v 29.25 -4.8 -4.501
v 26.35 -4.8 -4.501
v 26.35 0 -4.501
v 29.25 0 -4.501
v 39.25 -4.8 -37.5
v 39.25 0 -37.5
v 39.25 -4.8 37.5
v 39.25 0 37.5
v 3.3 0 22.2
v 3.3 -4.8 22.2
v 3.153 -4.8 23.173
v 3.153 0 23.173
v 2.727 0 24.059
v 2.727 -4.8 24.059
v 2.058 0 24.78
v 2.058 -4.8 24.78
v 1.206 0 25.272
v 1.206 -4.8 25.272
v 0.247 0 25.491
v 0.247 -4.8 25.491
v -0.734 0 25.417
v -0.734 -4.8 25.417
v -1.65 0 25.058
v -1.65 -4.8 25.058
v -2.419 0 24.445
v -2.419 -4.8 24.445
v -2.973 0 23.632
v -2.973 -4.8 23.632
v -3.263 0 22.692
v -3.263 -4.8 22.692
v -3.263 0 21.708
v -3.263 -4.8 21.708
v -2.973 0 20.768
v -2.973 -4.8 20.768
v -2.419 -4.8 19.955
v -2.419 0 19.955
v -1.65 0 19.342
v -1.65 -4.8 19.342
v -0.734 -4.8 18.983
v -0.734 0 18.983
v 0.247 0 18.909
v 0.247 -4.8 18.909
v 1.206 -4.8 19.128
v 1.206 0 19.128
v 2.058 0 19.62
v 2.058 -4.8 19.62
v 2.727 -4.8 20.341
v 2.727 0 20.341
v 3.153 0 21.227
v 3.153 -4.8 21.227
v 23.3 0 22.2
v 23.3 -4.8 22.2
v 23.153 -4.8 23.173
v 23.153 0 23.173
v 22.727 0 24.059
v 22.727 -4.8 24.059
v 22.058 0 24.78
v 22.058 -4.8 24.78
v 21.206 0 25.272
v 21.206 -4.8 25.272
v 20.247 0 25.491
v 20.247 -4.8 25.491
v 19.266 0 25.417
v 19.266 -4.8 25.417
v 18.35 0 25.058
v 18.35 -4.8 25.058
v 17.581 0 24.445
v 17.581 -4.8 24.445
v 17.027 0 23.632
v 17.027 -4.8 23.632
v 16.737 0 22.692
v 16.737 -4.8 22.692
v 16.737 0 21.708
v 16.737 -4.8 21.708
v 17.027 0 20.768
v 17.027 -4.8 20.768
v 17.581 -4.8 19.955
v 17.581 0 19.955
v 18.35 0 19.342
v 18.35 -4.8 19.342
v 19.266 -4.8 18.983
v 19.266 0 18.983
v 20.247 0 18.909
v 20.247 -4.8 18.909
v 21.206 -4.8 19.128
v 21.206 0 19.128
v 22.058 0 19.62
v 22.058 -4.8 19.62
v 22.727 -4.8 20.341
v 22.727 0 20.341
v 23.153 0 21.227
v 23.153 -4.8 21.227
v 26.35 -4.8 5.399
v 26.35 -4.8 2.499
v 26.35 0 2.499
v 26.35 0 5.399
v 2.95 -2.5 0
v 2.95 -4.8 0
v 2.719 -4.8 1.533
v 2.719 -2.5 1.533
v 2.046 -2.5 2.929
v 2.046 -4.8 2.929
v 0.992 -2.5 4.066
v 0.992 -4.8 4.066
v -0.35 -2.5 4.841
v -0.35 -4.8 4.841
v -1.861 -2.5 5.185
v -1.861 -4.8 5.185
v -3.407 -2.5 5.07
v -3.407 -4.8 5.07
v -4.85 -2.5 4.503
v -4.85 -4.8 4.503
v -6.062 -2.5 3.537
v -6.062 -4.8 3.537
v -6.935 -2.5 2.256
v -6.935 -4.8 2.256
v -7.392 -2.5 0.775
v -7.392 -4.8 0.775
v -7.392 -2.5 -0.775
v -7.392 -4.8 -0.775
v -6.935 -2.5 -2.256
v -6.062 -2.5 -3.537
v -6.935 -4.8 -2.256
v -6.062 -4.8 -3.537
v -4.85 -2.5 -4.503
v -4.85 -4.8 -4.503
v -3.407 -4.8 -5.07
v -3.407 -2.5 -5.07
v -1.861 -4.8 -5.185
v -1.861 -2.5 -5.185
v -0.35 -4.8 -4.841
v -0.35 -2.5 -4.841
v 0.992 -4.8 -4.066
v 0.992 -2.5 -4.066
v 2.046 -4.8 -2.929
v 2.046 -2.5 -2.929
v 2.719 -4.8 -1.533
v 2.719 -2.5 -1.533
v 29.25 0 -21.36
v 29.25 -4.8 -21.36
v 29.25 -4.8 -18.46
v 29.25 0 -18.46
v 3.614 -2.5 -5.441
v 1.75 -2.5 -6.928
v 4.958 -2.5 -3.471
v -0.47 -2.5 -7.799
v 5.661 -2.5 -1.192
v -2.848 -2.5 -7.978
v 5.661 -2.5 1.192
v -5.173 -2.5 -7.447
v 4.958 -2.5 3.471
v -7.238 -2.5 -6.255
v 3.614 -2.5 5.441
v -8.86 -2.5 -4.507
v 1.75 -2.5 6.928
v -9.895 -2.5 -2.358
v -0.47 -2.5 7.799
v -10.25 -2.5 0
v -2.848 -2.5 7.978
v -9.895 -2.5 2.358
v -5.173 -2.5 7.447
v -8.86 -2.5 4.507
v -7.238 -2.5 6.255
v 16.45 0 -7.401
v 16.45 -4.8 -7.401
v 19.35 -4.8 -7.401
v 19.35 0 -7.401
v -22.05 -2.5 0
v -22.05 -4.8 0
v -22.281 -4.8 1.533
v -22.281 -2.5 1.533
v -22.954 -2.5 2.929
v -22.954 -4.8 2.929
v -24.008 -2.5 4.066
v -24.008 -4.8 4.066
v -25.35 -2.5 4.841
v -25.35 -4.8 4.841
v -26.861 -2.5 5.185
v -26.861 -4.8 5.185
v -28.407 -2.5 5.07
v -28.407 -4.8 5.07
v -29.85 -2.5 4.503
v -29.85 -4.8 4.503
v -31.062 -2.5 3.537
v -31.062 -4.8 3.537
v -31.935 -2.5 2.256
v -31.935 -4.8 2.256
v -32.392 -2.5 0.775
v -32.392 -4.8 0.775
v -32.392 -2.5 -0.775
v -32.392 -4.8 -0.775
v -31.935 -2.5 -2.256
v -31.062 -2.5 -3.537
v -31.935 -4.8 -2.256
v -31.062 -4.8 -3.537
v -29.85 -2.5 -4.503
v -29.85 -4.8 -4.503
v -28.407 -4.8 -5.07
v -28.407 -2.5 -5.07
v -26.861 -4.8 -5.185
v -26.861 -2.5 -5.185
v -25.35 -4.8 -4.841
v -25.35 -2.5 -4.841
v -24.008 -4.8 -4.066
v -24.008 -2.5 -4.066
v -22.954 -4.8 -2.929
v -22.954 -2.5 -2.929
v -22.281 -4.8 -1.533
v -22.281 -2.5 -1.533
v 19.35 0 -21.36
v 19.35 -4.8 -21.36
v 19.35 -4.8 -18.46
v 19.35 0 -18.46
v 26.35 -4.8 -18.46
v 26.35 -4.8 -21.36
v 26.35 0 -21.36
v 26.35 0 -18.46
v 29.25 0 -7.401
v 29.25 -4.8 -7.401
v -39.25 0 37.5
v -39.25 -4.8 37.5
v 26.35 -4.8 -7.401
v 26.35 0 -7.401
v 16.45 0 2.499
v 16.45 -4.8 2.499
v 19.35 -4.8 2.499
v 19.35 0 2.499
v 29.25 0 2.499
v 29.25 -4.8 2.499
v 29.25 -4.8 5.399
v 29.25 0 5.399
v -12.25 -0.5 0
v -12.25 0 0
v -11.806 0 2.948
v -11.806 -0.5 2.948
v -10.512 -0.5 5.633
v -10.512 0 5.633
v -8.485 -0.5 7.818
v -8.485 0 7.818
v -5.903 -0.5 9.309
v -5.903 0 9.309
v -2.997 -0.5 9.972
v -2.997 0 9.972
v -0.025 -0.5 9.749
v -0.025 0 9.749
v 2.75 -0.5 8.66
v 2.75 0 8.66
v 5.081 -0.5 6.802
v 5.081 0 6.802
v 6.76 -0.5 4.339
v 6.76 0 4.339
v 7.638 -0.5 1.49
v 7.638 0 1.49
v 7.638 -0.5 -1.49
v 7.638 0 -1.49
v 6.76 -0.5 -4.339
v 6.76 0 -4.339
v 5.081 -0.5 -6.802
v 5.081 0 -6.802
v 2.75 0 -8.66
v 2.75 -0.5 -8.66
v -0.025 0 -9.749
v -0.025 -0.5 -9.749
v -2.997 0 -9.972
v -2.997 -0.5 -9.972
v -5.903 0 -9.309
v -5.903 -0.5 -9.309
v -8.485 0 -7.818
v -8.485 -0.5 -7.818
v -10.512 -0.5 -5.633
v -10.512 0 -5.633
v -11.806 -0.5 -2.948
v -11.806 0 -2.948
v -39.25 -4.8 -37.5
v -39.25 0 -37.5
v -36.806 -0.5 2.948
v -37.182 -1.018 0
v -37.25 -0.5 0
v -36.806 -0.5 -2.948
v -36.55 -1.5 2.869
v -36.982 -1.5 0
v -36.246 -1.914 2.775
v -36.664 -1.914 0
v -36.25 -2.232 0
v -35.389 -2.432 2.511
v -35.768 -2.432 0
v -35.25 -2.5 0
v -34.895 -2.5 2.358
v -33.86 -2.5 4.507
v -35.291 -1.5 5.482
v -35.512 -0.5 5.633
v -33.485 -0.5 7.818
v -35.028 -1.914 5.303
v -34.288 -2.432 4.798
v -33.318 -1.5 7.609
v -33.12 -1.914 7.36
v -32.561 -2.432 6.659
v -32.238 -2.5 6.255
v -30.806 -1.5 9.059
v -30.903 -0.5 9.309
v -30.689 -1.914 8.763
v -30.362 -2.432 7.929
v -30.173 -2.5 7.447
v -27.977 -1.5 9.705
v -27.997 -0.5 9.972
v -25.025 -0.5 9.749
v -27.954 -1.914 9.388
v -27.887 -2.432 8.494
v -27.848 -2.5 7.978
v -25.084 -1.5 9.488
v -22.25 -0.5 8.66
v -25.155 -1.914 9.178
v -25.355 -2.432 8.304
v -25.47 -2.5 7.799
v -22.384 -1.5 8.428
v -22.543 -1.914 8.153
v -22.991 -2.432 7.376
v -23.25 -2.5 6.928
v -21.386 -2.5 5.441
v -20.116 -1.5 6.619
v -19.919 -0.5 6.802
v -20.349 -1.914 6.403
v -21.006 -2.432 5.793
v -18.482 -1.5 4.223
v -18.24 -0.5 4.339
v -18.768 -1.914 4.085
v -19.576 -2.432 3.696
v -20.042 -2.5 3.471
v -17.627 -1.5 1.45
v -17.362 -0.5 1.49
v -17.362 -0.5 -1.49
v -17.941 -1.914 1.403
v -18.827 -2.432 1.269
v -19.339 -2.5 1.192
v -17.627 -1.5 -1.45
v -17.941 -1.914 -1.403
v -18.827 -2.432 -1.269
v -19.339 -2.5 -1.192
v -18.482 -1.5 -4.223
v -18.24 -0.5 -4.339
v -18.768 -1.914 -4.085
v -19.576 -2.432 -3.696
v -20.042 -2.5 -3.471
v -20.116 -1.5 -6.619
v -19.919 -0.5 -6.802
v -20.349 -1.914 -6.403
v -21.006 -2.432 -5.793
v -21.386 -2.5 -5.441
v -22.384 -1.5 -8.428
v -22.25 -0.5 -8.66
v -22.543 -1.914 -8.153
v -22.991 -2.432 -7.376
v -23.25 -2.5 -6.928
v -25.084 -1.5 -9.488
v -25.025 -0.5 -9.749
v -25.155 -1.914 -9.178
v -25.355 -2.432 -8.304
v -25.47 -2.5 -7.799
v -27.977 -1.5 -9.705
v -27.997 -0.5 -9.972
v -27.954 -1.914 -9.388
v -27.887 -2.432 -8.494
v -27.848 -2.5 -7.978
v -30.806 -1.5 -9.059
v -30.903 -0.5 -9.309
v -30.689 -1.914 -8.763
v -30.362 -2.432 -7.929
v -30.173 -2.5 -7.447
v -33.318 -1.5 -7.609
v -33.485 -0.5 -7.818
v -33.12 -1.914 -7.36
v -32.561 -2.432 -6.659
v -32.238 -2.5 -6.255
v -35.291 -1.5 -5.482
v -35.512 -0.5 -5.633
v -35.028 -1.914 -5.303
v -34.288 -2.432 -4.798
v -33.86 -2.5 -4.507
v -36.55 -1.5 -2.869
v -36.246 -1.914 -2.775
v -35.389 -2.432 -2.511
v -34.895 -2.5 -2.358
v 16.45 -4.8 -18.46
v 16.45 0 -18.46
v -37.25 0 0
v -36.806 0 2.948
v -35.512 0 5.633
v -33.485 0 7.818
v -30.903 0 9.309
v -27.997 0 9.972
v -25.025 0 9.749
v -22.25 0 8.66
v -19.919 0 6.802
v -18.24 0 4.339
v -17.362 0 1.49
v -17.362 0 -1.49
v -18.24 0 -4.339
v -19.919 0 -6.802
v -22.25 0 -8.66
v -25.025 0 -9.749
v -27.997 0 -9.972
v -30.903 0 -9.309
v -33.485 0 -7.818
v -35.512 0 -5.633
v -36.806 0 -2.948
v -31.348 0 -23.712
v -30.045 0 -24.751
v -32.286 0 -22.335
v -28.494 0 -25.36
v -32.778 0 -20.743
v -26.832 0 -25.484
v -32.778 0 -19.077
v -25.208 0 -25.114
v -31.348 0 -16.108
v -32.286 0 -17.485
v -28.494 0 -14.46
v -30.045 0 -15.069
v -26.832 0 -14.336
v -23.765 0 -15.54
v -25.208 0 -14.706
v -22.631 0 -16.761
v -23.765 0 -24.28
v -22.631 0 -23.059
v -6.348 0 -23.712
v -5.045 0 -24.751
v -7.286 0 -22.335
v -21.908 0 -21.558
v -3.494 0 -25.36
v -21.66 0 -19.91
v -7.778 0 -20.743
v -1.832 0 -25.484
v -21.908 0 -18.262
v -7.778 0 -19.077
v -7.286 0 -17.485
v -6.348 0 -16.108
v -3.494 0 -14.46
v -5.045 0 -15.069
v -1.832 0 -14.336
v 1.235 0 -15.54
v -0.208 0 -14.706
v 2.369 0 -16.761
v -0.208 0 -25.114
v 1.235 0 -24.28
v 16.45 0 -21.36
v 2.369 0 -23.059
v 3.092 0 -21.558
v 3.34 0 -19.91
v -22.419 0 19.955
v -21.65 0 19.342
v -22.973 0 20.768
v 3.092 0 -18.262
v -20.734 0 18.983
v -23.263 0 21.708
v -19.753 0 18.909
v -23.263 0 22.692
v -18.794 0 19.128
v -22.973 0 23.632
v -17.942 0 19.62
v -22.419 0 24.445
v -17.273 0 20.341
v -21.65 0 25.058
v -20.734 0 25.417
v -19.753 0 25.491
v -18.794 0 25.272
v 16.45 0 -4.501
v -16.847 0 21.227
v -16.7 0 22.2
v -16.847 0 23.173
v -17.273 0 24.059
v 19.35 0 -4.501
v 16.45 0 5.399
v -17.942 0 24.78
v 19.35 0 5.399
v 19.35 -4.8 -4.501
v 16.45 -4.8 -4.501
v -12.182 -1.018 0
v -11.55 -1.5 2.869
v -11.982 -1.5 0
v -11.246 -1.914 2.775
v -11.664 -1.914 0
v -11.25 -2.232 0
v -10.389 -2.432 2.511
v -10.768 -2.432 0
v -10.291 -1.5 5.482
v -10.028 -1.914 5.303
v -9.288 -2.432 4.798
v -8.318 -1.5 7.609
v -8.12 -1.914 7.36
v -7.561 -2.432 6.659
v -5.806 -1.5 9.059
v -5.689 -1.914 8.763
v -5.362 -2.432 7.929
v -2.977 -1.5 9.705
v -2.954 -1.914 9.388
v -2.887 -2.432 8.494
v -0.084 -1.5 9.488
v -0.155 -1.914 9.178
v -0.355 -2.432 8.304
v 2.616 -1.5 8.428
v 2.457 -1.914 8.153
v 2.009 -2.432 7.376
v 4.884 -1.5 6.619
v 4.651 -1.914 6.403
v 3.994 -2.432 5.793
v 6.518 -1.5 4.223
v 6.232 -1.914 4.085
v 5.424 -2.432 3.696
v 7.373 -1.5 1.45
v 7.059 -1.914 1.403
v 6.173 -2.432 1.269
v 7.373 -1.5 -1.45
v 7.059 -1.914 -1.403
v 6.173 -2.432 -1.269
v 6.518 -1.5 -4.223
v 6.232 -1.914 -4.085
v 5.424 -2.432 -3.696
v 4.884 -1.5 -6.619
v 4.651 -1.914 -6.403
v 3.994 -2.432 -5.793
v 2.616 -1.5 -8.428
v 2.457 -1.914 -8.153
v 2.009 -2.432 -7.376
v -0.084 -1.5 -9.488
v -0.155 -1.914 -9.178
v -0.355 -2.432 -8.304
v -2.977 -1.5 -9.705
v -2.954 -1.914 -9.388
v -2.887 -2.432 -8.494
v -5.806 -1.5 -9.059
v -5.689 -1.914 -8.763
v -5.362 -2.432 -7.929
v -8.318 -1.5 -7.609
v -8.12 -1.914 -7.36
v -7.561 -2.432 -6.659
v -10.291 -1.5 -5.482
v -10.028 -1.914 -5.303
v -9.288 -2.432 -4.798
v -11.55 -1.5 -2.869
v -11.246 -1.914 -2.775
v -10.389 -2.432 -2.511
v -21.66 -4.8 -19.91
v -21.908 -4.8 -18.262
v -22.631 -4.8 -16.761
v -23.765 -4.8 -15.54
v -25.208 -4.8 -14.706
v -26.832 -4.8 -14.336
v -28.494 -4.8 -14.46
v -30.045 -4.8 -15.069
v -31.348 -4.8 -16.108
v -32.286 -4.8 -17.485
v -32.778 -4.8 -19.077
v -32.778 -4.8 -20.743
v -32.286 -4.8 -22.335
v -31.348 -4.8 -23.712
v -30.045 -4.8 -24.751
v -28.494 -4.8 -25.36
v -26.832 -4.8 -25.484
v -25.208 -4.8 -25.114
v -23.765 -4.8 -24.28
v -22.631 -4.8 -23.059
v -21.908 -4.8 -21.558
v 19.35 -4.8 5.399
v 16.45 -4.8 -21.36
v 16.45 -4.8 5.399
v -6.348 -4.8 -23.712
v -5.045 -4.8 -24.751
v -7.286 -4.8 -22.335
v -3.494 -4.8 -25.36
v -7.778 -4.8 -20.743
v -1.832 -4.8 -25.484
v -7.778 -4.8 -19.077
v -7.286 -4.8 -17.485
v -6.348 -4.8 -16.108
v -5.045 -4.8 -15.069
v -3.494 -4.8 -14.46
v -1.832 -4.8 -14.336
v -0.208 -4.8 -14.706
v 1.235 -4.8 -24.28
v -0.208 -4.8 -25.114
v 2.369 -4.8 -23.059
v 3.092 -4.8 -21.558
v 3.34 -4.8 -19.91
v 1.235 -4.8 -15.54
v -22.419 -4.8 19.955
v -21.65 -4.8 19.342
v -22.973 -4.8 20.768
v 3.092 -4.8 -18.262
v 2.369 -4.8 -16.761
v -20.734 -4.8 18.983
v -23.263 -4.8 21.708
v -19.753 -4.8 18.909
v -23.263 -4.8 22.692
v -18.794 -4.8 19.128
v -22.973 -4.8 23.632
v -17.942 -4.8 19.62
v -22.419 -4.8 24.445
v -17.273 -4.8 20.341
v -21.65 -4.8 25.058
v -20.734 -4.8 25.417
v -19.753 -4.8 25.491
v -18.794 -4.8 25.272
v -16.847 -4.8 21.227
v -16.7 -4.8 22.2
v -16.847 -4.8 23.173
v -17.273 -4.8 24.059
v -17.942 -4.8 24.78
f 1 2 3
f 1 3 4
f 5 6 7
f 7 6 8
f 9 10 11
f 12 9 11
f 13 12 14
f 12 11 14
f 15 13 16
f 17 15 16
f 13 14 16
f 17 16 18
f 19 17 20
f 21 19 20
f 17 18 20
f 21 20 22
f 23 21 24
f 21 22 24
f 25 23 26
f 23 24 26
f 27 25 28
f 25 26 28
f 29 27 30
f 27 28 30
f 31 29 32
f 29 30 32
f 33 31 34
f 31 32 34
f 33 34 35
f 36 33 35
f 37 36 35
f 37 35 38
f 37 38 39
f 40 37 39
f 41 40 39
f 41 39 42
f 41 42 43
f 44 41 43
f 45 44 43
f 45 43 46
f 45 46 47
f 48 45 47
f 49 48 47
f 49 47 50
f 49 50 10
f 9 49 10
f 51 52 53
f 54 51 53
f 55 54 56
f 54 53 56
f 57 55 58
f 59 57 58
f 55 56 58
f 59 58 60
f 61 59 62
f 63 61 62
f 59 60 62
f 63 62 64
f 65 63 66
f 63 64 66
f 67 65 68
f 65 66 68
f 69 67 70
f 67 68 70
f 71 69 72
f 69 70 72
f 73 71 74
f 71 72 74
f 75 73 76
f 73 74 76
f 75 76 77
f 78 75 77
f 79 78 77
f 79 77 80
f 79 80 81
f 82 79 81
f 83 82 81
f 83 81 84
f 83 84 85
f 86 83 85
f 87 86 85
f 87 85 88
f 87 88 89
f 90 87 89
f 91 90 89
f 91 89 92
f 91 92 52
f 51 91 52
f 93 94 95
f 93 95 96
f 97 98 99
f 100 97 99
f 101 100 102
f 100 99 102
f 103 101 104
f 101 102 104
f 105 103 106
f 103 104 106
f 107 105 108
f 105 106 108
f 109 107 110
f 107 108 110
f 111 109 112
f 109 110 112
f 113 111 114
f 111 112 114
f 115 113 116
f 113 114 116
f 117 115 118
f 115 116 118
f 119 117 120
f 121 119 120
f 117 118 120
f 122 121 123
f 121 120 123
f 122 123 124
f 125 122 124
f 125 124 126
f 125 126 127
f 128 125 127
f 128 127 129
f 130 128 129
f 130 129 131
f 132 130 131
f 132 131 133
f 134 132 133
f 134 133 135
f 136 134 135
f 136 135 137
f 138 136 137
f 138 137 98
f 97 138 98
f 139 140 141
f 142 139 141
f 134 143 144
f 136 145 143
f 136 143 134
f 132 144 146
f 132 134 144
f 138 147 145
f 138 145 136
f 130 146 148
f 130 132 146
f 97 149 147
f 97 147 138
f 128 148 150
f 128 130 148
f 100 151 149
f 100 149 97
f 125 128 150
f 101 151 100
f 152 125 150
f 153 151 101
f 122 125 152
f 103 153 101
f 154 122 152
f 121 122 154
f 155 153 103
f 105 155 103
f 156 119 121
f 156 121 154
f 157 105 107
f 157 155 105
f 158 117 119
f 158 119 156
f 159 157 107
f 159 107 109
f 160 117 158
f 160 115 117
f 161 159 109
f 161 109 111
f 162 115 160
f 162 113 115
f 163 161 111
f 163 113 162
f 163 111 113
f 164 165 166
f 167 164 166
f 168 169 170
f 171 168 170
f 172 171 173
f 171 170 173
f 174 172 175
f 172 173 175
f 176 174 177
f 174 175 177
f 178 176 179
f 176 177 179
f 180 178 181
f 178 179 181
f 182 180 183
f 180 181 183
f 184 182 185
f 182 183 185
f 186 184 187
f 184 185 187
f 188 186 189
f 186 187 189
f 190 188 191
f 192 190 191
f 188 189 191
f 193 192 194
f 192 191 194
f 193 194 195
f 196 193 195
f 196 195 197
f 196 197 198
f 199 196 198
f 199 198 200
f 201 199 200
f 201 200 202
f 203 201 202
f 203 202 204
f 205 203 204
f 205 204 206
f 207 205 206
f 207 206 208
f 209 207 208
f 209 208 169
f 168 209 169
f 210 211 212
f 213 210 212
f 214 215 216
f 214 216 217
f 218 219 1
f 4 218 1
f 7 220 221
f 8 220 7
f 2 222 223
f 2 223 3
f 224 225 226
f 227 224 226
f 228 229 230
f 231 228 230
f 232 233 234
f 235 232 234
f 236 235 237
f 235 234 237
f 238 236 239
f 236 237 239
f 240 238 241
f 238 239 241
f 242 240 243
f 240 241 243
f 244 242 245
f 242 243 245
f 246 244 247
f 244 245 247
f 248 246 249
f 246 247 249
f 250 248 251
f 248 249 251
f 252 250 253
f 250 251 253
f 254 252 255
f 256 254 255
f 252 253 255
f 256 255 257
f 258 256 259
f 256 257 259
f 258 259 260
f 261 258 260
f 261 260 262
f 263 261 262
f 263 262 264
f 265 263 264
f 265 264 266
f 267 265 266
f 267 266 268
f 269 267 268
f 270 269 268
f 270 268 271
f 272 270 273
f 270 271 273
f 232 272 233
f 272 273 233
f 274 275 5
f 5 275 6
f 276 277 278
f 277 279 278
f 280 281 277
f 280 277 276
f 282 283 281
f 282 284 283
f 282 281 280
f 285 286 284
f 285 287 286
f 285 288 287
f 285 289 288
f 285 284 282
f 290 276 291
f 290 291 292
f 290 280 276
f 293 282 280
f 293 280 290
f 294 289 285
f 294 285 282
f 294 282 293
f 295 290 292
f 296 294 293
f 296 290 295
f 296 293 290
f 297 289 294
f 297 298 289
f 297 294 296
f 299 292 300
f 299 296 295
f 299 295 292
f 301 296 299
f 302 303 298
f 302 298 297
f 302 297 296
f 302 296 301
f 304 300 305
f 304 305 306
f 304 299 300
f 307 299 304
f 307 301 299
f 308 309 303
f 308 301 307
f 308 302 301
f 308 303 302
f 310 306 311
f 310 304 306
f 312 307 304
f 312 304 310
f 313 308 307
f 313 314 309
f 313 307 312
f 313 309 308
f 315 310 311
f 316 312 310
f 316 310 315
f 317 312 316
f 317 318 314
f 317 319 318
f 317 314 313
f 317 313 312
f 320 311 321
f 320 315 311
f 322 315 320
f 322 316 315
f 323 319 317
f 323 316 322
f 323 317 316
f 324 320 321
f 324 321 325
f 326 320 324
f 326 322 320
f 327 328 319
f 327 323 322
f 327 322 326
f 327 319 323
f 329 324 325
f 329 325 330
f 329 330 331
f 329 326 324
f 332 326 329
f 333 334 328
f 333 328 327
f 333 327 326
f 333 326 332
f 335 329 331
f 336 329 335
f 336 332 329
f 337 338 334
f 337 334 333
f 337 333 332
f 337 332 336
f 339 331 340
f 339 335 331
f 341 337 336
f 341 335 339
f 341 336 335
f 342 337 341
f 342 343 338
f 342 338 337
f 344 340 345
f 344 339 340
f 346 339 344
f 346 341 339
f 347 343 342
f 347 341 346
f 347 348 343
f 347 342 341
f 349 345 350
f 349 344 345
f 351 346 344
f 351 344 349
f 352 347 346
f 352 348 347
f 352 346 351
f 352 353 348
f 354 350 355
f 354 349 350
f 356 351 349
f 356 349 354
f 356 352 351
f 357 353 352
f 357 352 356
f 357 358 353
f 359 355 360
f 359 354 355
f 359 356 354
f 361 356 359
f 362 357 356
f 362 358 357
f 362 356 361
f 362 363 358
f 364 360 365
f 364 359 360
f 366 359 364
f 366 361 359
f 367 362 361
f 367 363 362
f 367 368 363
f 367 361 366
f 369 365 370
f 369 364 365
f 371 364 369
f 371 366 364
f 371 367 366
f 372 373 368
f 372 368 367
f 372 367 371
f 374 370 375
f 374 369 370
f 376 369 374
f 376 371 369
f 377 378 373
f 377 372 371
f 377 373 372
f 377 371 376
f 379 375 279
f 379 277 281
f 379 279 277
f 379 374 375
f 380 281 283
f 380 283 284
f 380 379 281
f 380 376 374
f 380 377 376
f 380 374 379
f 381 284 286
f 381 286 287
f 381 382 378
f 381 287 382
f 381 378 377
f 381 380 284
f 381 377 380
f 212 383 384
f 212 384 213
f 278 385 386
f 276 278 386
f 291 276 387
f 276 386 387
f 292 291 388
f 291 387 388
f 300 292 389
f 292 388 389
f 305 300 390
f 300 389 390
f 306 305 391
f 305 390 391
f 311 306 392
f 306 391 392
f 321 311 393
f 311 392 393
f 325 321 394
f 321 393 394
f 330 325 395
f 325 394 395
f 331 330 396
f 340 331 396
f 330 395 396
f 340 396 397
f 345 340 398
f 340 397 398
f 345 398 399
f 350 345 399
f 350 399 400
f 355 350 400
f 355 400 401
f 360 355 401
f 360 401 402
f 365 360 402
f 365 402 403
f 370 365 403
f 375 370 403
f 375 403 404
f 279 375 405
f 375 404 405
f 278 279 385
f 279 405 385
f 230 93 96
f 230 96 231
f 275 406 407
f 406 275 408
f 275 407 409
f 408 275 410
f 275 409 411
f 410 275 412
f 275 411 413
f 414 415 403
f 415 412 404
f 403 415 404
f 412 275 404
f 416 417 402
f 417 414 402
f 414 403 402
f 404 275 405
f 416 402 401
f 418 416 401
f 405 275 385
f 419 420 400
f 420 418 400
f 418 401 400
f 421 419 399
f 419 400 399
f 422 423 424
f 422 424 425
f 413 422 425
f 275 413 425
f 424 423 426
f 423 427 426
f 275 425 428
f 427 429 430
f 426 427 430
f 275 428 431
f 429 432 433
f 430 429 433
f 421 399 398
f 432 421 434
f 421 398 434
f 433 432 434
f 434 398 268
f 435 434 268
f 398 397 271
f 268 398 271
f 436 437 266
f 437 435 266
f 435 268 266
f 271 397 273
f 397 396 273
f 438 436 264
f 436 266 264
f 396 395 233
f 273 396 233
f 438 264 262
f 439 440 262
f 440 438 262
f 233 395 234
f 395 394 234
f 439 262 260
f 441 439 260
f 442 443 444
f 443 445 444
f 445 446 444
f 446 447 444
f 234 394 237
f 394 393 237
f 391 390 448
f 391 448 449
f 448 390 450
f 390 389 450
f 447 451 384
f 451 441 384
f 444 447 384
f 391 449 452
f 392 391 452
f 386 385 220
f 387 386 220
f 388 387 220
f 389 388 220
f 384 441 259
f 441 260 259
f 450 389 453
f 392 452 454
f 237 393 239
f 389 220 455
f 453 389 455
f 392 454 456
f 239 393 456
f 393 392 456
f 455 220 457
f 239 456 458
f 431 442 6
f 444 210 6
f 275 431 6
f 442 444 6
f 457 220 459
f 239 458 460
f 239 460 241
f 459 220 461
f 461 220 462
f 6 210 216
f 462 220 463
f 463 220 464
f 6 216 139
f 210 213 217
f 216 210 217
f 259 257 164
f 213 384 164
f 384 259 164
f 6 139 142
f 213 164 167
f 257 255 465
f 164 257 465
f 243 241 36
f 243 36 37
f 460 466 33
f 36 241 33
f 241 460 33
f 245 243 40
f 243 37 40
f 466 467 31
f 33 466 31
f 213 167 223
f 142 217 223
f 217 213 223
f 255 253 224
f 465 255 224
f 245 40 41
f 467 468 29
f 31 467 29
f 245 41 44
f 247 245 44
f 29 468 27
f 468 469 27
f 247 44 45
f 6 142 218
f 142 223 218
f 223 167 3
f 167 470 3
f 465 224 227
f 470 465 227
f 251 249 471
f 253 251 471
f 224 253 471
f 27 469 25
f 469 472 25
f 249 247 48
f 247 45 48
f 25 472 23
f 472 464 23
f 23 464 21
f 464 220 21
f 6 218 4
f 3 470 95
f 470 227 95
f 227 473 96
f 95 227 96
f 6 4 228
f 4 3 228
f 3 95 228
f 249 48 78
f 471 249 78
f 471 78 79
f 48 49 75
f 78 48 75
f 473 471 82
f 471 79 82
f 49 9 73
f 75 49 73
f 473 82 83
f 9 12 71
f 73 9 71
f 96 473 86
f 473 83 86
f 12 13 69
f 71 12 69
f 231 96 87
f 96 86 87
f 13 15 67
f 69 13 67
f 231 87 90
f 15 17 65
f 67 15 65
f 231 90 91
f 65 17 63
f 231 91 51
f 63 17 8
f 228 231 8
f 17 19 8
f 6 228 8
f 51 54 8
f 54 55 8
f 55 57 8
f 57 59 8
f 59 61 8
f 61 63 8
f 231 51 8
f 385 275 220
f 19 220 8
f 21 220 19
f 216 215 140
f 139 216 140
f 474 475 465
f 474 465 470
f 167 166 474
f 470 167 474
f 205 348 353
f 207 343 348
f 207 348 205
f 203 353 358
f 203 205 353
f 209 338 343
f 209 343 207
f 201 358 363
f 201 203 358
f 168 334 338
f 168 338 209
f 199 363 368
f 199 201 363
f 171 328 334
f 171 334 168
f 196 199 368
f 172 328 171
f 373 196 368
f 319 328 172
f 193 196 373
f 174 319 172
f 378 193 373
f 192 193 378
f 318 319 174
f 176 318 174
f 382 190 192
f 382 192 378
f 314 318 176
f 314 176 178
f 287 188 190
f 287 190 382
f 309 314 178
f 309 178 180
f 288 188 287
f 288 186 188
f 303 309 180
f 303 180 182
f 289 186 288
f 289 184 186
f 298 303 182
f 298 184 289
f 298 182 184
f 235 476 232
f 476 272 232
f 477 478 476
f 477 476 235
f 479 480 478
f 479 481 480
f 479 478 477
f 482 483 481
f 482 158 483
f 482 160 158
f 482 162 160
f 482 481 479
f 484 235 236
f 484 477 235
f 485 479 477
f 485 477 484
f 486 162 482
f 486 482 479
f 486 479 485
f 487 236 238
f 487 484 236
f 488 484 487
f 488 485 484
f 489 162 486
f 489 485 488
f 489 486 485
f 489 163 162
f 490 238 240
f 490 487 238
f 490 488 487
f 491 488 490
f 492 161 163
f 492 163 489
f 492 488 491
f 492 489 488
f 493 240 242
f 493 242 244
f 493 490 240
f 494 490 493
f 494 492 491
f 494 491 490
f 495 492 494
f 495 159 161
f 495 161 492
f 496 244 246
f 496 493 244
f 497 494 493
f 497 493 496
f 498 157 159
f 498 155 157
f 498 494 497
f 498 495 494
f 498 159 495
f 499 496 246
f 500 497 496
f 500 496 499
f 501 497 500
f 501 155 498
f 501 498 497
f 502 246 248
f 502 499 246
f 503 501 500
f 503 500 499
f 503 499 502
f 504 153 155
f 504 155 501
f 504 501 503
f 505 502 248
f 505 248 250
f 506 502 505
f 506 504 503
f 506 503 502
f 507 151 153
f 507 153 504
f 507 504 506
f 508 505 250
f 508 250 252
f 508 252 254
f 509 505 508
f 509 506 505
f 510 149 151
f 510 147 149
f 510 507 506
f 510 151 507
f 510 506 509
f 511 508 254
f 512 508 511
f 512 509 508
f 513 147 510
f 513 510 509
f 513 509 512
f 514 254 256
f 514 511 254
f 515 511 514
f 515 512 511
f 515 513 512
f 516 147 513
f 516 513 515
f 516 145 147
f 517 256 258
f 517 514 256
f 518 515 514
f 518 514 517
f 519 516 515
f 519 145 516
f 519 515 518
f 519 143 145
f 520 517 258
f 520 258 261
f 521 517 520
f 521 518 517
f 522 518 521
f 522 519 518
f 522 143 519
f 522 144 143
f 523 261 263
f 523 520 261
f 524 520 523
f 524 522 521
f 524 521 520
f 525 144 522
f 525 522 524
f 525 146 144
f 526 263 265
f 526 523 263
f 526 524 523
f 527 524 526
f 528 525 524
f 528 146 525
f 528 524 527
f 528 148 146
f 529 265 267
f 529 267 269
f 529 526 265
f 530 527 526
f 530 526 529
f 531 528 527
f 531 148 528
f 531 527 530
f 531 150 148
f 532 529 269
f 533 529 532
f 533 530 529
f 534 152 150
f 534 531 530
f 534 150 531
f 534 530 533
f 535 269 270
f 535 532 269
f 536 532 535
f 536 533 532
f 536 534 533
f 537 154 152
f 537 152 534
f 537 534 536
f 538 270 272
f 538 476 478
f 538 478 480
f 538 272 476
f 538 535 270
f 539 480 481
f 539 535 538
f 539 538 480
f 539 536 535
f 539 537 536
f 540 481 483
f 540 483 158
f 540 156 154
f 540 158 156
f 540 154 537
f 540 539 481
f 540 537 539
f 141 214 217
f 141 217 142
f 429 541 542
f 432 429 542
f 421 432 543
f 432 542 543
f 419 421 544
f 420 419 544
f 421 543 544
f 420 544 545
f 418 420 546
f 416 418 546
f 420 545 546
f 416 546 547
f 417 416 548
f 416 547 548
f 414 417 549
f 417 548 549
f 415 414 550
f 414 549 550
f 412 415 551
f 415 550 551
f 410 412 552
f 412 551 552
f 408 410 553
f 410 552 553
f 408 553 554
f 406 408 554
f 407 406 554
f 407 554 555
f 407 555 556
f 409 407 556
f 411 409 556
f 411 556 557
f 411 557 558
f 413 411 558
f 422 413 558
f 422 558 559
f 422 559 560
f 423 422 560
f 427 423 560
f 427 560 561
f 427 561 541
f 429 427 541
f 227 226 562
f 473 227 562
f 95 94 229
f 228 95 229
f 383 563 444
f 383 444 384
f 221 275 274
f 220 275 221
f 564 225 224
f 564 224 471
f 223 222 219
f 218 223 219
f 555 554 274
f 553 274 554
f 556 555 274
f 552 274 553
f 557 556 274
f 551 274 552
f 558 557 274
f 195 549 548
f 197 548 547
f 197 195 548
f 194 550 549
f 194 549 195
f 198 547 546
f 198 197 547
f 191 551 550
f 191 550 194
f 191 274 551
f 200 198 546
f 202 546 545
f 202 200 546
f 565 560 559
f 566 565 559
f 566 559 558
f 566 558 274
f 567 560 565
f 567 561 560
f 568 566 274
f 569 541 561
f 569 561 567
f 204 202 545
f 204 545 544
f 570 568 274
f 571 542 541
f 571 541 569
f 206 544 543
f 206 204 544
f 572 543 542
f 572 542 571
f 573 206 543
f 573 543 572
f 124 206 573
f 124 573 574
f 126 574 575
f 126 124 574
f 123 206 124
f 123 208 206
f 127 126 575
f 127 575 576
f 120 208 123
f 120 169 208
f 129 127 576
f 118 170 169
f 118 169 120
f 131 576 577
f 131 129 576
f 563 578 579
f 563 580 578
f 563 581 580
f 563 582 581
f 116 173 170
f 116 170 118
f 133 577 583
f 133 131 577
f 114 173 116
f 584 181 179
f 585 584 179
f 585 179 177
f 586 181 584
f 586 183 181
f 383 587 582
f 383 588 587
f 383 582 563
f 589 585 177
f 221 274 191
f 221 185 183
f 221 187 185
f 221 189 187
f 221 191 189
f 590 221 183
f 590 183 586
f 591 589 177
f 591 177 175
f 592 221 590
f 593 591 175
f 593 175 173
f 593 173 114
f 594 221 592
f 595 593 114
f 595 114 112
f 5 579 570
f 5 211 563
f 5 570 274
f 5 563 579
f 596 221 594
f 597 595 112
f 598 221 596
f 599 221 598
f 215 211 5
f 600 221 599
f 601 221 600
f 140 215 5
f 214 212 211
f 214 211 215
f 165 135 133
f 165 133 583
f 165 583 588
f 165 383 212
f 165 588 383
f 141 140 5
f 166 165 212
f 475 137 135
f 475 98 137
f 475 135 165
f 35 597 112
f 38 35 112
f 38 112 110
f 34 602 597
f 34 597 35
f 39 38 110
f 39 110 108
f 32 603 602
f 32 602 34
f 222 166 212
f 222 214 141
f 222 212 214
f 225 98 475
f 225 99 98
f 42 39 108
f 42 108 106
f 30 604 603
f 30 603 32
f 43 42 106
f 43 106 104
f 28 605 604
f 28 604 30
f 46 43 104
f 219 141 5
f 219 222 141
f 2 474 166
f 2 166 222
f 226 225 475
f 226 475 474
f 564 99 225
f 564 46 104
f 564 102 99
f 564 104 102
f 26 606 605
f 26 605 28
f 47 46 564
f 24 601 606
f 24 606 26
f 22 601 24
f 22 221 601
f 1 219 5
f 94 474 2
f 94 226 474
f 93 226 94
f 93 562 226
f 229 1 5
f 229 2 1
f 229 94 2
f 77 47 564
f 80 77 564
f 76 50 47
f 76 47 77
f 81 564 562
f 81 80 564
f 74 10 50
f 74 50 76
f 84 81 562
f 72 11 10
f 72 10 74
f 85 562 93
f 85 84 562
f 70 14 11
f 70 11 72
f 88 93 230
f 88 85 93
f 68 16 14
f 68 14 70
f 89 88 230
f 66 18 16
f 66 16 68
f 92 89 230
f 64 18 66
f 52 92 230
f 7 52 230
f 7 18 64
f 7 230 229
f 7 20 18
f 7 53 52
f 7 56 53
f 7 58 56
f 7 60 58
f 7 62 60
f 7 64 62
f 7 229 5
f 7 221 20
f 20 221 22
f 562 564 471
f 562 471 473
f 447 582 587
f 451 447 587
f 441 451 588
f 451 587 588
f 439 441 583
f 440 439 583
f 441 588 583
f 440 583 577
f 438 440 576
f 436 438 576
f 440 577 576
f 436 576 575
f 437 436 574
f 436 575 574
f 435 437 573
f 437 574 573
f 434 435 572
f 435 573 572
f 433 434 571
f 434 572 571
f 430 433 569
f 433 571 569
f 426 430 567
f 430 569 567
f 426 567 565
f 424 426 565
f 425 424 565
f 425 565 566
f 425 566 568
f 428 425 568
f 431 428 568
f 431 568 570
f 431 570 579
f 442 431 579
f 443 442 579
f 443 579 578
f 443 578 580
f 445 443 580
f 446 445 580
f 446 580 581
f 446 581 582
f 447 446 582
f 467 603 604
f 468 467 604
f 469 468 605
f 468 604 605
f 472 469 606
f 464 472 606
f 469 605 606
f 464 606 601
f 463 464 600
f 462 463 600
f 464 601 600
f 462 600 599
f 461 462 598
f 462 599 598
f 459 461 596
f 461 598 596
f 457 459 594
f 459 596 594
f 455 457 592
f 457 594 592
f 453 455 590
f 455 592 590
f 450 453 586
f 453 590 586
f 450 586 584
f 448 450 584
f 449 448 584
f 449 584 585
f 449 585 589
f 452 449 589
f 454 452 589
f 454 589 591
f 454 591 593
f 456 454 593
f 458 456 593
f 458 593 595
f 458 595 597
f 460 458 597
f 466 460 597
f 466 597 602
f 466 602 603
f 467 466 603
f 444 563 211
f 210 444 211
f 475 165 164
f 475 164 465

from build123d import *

# Parameters (mm, degrees)
F0_W     = 78.5
F0_H     = 75
F1_DEPTH = 4.8
F2_R     = 5.2
F2_R_2   = 5.59
F2_R_3   = 3.3
F2_W     = 2.9
F2_H     = 2.9
F3_DEPTH = 4.801
F4_R     = 10
F5_DEPTH = 2.5
F6_R     = 2


with BuildPart() as f1:
    # F0 (on Front) → F1 (new body)
    with BuildSketch(Plane.XZ):
        Rectangle(F0_W, F0_H)
    extrude(amount=F1_DEPTH)

    # F2 (on face) → F3 (cut, through all)
    with BuildSketch(Plane.XZ.offset(4.8)):
        with Locations((-27.25, 0)):
            Circle(F2_R)
        with Locations((-27.25, -19.91)):
            Circle(F2_R_2)
        with Locations((-2.25, -19.91)):
            Circle(F2_R_2)
        with Locations((-2.25, 0)):
            Circle(F2_R)
        with Locations((0, 22.2)):
            Circle(F2_R_3)
        with Locations((-20, 22.2)):
            Circle(F2_R_3)
        with Locations((20, 22.2)):
            Circle(F2_R_3)
        with Locations((17.9, 3.948761)):
            Rectangle(F2_W, F2_H)
        with Locations((27.8, 3.948761)):
            Rectangle(F2_W, F2_H)
        with Locations((17.9, -5.951239)):
            Rectangle(F2_W, F2_H)
        with Locations((27.8, -5.951239)):
            Rectangle(F2_W, F2_H)
        with Locations((17.9, -19.91)):
            Rectangle(F2_W, F2_H)
        with Locations((27.8, -19.91)):
            Rectangle(F2_W, F2_H)
    extrude(amount=-F3_DEPTH, mode=Mode.SUBTRACT)

    # F4 (on face) → F5 (cut)
    with BuildSketch(Plane(origin=(0, 0, 0), x_dir=(-1, 0, 0), z_dir=(0, 1, 0))):
        with Locations((2.25, 0)):
            Circle(F4_R)
        with Locations((27.25, 0)):
            Circle(F4_R)
    extrude(amount=-F5_DEPTH, mode=Mode.SUBTRACT)

    # F6
    f6_edges = [f1.edges().sort_by_distance(p)[0] for p in [
        (7.75, -2.5, 0),
        (-17.25, -2.5, 0),
    ]]
    fillet(f6_edges, radius=F6_R)


solid = f1.part
